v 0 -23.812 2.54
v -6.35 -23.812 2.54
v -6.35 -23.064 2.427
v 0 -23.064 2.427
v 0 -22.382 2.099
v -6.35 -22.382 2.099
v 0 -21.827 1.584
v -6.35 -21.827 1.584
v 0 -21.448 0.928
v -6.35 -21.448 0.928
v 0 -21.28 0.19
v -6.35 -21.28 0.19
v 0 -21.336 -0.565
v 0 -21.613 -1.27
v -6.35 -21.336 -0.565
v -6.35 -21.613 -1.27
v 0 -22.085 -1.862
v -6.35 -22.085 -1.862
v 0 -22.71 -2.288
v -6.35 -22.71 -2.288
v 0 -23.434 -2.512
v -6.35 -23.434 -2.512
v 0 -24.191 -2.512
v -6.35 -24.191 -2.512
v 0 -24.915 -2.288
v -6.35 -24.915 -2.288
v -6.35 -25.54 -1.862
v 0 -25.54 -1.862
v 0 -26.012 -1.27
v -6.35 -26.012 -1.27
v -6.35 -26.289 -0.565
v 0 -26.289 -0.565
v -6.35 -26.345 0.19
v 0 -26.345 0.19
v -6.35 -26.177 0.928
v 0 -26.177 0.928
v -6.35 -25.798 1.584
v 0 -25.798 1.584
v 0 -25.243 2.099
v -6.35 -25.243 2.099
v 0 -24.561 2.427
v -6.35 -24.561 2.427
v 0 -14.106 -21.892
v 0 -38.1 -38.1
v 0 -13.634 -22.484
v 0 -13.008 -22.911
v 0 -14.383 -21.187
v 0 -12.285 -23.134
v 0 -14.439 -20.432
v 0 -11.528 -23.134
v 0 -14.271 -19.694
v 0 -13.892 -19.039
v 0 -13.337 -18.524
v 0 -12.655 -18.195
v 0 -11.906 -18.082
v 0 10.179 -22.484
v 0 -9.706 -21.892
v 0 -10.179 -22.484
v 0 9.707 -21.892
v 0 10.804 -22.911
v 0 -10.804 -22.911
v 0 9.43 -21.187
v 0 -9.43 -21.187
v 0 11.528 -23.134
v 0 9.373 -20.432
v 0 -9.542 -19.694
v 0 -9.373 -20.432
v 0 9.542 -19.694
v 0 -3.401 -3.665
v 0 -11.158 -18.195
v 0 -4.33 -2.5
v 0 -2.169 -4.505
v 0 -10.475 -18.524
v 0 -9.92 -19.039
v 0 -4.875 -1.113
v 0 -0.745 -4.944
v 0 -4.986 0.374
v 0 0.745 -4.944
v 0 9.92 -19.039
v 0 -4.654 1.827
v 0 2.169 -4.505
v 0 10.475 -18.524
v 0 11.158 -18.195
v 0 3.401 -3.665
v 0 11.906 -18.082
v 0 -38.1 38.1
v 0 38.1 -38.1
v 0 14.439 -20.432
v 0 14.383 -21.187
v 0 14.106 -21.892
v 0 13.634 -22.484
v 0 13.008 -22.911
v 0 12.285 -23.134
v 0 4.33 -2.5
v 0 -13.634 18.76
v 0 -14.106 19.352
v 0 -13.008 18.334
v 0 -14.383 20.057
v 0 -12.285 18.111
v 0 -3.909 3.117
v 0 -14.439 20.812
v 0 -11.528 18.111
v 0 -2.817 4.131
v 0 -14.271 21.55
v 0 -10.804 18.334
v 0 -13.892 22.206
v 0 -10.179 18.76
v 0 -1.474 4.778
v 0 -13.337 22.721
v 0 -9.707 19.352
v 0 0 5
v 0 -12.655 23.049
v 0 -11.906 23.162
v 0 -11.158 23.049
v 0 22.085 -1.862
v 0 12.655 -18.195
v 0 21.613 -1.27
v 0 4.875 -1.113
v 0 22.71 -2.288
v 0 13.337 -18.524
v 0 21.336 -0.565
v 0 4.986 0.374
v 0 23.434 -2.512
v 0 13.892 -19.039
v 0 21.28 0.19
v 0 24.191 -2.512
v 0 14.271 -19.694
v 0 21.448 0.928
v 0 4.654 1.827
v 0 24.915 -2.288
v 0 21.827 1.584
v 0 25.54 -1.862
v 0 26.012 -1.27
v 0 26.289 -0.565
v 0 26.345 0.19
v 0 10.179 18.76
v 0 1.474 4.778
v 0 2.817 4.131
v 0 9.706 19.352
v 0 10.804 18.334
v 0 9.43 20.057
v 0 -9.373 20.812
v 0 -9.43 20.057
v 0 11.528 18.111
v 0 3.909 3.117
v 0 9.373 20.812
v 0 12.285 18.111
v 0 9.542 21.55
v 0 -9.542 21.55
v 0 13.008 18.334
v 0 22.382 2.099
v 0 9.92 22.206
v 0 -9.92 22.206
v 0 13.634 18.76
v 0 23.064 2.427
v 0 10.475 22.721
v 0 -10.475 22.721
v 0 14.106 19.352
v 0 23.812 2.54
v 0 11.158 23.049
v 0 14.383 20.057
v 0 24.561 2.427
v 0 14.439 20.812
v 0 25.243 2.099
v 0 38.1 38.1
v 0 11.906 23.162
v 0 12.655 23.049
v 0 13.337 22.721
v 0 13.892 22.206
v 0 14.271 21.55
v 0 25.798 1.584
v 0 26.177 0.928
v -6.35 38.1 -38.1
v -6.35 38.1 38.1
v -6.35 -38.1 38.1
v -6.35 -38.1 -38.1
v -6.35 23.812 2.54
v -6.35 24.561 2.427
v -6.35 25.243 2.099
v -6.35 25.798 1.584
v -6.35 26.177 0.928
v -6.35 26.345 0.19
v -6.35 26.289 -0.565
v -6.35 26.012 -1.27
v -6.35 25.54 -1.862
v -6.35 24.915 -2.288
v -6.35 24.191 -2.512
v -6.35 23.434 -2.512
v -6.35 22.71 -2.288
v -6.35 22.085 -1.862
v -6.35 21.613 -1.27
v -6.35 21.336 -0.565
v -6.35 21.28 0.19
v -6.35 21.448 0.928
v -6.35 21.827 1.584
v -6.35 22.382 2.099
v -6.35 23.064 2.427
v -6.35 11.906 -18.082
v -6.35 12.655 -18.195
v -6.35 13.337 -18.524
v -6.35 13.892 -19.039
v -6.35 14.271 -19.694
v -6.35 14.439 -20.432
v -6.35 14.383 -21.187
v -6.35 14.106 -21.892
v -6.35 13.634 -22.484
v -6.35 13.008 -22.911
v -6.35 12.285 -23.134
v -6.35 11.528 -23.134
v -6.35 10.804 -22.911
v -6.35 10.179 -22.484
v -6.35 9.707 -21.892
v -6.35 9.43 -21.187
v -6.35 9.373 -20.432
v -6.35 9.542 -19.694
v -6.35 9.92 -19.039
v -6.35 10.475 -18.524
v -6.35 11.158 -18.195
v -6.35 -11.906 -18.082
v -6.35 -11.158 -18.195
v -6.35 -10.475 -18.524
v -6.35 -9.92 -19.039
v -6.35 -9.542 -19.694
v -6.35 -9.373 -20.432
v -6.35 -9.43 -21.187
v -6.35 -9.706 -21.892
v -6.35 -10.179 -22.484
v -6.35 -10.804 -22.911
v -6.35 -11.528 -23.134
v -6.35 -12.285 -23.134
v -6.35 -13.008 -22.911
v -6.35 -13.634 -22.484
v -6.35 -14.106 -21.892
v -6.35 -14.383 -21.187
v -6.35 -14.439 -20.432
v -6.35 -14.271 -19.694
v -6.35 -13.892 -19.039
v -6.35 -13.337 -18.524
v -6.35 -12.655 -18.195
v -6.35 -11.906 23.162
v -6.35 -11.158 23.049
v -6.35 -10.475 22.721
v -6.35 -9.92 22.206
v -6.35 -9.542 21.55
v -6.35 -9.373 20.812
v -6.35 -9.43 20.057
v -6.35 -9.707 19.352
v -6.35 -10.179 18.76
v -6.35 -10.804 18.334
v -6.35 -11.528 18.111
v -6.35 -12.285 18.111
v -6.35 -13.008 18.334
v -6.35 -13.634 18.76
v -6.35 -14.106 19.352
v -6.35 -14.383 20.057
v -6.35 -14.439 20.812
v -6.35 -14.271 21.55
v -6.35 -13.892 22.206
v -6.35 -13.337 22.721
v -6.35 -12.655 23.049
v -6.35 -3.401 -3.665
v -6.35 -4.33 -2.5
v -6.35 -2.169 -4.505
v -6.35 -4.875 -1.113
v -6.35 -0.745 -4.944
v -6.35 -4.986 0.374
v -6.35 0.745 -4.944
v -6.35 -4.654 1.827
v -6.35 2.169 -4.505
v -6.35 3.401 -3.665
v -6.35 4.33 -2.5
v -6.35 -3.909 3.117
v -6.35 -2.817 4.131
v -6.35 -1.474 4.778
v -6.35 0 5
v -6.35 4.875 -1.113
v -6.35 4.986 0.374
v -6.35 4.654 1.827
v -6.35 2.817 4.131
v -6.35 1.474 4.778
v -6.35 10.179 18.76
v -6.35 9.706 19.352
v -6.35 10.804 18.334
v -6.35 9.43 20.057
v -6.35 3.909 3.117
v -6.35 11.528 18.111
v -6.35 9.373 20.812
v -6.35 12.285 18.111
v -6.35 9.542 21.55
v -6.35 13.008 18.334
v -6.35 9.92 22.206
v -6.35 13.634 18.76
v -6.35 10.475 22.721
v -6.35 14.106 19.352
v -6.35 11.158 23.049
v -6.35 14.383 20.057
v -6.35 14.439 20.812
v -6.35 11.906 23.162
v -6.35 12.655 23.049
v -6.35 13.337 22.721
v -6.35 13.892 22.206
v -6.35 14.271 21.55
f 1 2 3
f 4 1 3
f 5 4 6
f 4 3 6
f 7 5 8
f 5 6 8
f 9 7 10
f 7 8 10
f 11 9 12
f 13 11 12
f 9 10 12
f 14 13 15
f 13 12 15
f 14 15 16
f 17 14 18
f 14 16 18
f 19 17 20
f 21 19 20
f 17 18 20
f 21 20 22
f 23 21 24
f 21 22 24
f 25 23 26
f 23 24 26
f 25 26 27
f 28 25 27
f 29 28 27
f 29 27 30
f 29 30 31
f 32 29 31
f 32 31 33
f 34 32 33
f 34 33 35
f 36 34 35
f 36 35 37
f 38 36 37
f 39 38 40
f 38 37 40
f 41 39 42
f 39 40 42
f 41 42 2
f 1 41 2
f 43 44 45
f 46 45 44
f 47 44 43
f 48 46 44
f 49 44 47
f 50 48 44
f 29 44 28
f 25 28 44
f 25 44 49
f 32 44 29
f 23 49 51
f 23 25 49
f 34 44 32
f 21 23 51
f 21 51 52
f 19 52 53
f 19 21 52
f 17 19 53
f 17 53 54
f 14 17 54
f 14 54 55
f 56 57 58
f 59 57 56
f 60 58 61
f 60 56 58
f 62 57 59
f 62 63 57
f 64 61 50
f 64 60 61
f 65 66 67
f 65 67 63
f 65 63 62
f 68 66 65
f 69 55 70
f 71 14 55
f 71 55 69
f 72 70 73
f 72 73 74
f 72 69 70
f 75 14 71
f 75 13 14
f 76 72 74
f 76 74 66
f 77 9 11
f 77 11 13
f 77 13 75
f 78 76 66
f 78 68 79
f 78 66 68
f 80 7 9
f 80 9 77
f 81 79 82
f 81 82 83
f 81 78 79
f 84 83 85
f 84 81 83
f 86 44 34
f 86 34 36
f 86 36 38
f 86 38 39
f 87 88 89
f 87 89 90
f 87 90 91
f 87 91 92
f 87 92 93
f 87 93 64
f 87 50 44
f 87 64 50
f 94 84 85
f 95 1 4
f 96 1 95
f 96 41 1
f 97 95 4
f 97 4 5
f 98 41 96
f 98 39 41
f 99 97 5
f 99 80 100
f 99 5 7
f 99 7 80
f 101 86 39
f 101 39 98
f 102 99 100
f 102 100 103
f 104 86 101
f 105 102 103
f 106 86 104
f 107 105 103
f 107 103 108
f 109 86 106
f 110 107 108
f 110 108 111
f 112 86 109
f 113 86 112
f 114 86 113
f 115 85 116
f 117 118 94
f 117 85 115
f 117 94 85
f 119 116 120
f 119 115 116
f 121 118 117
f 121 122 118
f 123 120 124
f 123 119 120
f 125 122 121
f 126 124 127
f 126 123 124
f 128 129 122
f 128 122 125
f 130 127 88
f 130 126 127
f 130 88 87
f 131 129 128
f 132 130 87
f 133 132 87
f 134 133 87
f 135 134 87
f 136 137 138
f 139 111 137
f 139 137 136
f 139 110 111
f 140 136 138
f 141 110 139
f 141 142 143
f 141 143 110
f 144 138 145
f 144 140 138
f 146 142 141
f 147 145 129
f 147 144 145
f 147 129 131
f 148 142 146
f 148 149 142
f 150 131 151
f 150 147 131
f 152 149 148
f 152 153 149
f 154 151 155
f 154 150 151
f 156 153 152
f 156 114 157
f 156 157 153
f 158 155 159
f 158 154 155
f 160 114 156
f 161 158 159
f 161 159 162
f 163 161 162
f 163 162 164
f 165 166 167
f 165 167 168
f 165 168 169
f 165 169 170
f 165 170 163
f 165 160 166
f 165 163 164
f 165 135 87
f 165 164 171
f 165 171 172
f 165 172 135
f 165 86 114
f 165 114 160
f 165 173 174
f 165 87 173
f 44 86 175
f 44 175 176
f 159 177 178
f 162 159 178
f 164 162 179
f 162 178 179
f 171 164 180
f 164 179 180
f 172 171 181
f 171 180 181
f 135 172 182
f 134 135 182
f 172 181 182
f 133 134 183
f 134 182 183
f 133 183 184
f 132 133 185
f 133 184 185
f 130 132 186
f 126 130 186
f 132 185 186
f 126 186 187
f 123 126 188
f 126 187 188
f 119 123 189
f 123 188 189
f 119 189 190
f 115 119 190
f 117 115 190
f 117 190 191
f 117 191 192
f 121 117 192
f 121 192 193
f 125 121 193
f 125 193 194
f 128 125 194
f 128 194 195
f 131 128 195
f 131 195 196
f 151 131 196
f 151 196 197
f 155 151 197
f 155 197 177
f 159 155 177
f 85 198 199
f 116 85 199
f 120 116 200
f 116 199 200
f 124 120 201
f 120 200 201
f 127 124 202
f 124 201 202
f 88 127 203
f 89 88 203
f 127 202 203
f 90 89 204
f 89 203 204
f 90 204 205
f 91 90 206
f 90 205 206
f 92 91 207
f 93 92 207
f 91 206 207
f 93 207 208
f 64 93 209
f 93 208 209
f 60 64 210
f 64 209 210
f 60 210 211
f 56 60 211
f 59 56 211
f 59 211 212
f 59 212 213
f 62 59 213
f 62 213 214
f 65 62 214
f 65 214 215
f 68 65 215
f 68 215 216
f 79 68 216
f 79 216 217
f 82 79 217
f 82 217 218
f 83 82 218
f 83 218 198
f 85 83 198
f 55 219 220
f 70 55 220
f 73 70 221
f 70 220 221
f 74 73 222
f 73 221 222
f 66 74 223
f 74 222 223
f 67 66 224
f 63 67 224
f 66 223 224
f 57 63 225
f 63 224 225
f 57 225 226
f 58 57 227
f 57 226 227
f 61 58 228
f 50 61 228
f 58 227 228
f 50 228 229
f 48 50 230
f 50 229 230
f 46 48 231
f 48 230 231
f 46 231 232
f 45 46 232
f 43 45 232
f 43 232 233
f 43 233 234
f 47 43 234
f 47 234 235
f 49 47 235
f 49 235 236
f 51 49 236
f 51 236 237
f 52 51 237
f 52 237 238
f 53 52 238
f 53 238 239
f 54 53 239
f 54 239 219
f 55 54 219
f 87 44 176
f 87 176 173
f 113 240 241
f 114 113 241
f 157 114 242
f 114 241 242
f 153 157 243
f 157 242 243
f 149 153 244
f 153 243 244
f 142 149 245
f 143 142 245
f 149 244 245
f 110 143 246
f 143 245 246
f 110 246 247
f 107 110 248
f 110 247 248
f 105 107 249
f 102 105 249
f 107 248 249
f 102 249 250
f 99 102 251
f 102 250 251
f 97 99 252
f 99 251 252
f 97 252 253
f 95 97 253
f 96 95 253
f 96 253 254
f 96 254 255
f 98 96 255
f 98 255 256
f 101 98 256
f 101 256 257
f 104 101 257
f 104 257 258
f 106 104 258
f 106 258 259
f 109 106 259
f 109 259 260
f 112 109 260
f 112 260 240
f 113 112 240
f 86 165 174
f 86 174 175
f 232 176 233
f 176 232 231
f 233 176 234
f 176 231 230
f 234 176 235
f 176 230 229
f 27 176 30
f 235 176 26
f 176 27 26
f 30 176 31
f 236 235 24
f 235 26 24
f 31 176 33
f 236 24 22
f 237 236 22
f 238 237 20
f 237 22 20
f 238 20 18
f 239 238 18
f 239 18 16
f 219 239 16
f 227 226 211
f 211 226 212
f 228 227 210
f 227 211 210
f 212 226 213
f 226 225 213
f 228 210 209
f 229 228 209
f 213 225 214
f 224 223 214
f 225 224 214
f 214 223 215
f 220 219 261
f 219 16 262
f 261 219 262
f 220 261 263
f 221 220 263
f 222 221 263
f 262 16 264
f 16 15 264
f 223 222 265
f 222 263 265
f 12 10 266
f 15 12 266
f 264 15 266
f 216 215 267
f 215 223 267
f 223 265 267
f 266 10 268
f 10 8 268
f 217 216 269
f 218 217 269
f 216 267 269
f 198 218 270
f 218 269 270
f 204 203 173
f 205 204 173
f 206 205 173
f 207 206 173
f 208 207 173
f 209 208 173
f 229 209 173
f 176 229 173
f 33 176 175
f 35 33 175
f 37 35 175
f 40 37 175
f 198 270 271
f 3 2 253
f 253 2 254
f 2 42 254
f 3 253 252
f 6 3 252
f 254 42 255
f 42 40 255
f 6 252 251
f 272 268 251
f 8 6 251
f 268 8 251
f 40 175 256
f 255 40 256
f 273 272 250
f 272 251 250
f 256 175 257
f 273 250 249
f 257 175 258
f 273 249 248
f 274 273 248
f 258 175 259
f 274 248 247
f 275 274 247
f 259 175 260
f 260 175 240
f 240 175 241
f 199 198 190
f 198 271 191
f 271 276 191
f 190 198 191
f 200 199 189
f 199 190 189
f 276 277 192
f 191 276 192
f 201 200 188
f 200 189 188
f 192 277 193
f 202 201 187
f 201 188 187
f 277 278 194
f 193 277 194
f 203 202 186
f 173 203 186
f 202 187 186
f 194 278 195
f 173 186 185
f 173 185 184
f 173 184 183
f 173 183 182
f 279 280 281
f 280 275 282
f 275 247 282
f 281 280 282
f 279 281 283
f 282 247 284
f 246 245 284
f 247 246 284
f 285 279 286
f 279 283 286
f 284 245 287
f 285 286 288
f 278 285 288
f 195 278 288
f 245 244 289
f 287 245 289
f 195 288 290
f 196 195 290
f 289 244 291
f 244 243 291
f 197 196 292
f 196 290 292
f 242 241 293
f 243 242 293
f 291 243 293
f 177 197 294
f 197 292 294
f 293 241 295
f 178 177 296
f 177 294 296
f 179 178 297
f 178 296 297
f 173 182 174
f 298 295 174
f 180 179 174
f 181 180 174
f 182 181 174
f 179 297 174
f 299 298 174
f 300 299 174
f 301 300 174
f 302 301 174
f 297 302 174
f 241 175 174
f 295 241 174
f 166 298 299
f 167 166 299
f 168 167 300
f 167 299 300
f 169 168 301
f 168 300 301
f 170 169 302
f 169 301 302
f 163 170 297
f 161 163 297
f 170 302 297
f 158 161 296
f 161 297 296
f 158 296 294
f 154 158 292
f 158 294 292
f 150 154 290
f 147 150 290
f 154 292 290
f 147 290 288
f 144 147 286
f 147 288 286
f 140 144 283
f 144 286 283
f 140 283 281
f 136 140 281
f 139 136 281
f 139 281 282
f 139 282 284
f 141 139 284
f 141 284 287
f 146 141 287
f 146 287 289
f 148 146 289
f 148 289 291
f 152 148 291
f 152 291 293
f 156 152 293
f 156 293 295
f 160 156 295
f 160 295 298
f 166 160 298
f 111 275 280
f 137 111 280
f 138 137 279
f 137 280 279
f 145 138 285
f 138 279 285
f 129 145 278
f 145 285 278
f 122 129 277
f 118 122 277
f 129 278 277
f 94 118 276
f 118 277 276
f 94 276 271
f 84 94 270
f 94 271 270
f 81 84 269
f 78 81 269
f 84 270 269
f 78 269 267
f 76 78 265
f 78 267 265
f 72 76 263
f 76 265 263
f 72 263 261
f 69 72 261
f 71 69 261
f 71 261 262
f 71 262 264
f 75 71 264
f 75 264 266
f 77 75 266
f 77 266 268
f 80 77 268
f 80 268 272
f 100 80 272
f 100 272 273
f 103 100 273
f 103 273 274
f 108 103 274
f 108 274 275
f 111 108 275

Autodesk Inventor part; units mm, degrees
ref_plane "YZ Plane" through (0, 0, 0) normal (1, 0, 0) x (0, 1, 0)
ref_plane "XZ Plane" through (0, 0, 0) normal (0, 1, 0) x (-1, 0, 0)
ref_plane "XY Plane" through (0, 0, 0) normal (0, 0, 1) x (1, 0, 0)
sketch "Sketch1" plane through (0, 0, 0) normal (1, 0, 0) x (0, 1, 0)
  line L0 (-38.1, 38.1) -> (-38.1, -38.1)
  line L1 (-38.1, -38.1) -> (38.1, -38.1)
  line L2 (38.1, -38.1) -> (38.1, 38.1)
  line L3 (38.1, 38.1) -> (-38.1, 38.1)
  line L4 (-38.1, 38.1) -> (38.1, -38.1) construction
  line L5 (-38.1, -38.1) -> (38.1, 38.1) construction
  point P0 (0, 0)
  dimension "d0" = 76.2
  dimension "d1" = 76.2
extrude "Extrusion1" add sketch "Sketch1" against normal blind 6.35
sketch "Sketch4" plane through (-6.35, 0, 0) normal (-1, 0, 0) x (0, 0, 1)
  circle A0 centre (0, -23.8125) radius 2.54
  circle A1 centre (20.6222, -11.9063) radius 2.54
  circle A2 centre (20.6222, 11.9062) radius 2.54
  circle A3 centre (0, 23.8125) radius 2.54
  circle A4 centre (-20.6222, 11.9063) radius 2.54
  circle A5 centre (-20.6222, -11.9062) radius 2.54
  point P0 (0, 0)
  dimension "d13" = 5.08
  dimension "d14" = 23.8125
  dimension "d17" = 360
extrude "Extrusion3" cut sketch "Sketch4" against normal through all
sketch "Sketch5" plane through (-6.35, 0, 0) normal (-1, 0, 0) x (0, 0, 1)
  circle A0 centre (0, 0) radius 5
  dimension "d21" = 10
extrude "Extrusion4" cut sketch "Sketch5" against normal through all
equation "\"d13\" = amHubBoltDiam"
equation "\"d14\" = 0.5 * amHubBoltHoleDiam"
equation "\"d21\" = centerHoleDiam"
equation "\"amHubBoltHoleDiam\" = 47.625"
equation "\"amHubBoltDiam\" = 5.08"
equation "\"centerHoleDiam\" = 10"
properties part number "PlateForConnectionToArm" material "Aluminum 6061"
